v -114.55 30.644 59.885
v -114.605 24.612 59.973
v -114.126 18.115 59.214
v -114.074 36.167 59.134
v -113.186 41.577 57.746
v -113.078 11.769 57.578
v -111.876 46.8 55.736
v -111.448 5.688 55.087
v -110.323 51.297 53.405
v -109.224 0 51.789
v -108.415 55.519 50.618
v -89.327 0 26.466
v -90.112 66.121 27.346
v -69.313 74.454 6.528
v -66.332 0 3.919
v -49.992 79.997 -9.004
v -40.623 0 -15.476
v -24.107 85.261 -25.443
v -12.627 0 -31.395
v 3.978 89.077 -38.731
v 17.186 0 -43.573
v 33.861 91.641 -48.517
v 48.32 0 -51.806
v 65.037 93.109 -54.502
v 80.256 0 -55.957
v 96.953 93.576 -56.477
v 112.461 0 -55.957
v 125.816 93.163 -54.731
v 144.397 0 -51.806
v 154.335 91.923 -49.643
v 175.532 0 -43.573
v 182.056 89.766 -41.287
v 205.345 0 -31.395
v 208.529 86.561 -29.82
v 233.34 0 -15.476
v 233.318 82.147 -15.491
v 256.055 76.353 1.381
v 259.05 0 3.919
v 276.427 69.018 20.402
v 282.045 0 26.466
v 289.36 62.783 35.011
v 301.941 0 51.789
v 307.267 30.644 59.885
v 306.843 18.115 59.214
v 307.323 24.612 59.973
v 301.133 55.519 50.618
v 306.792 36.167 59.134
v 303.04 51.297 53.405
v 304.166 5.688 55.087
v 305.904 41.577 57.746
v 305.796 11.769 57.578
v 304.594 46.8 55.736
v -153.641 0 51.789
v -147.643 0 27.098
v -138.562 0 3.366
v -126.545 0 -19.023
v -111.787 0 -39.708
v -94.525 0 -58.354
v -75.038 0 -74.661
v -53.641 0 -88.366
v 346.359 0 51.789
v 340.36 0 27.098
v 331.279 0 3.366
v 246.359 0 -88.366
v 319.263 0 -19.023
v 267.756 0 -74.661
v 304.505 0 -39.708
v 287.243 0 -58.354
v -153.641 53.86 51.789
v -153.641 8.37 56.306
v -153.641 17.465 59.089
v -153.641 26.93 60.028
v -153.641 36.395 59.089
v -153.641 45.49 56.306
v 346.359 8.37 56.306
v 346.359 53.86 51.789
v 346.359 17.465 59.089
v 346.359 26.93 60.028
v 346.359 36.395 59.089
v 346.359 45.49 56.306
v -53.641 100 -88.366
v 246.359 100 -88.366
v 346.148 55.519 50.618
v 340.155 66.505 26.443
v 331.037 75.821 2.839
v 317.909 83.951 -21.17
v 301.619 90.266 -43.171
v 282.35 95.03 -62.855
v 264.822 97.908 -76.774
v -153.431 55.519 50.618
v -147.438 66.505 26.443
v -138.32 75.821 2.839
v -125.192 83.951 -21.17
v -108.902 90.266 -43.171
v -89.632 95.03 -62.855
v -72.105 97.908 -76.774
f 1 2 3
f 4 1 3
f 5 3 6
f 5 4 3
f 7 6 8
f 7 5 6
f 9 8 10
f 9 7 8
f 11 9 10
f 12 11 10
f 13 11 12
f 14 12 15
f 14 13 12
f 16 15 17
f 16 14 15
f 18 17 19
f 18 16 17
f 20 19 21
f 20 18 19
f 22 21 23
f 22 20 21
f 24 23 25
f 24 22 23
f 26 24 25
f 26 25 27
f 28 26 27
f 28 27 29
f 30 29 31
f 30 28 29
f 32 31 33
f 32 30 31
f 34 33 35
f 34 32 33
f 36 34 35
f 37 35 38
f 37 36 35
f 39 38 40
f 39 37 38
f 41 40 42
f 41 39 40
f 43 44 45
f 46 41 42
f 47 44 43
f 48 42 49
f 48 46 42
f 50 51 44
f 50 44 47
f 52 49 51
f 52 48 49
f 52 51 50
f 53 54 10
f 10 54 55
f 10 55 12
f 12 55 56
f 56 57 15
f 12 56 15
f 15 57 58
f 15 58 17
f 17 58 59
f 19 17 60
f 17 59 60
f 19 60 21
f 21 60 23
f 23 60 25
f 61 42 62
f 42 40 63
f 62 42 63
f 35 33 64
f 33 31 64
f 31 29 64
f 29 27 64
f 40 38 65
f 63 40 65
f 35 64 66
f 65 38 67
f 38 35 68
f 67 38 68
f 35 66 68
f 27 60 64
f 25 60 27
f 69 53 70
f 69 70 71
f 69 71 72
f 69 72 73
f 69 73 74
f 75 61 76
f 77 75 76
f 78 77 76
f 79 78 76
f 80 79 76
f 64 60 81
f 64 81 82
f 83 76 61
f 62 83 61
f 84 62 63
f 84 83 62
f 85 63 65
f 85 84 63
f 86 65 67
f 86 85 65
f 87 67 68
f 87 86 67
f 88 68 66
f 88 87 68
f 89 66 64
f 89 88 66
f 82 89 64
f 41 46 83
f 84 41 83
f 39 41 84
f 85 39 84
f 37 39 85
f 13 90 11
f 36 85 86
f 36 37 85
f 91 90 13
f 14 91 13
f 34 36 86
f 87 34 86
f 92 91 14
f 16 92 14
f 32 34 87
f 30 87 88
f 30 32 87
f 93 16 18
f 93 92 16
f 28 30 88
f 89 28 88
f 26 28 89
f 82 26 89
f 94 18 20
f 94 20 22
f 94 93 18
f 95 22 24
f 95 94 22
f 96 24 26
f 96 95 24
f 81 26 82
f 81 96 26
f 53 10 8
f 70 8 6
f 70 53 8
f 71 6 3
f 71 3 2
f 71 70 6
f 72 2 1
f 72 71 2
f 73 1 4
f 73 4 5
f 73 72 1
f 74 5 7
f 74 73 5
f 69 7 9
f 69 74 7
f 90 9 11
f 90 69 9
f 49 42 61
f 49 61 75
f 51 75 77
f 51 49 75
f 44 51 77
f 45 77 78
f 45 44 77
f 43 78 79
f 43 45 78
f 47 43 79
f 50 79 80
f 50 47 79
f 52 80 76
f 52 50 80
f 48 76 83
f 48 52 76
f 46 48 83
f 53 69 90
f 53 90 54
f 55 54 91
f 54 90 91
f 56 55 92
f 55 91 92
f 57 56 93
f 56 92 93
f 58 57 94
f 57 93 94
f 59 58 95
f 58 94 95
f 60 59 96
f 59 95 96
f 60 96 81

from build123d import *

# Parameters (mm, degrees)
SKETCH2_W           = 500
SKETCH2_H           = 150
BOSS_EXTRUDE1_DEPTH = 100
CUT_EXTRUDE1_DEPTH  = 540
SKETCH5_R           = 249.318658331
CUT_EXTRUDE2_DEPTH  = 560
CUT_EXTRUDE3_DEPTH  = 560


with BuildPart() as part:
    # Sketch2 → Boss-Extrude1 (new body)
    with BuildSketch(Plane(origin=(0, 0, 0), x_dir=(1, 0, 0), z_dir=(0, 1, 0))):
        with Locations((96.358792185, 13.36589698)):
            Rectangle(SKETCH2_W, SKETCH2_H)
    extrude(amount=BOSS_EXTRUDE1_DEPTH)

    # Sketch4 → Cut-Extrude1 (cut)
    with BuildSketch(Plane.ZY.offset(153.641207815)):
        with BuildLine():
            Line((-88.36589698, 100), (61.63410302, 100))
            Line((61.63410302, 100), (61.63410302, 50))
            Line((61.63410302, 50), (61.63410302, 0))
            Line((61.63410302, 0), (51.789240426, 0))
            ThreePointArc((51.789240426, 0), (60.017726044, 27.945379527), (50.617731539, 55.518778225))
            ThreePointArc((50.617731539, 55.518778225), (-17.284897104, 82.724872852), (-88.36589698, 100))
        make_face()
    extrude(amount=-CUT_EXTRUDE1_DEPTH, mode=Mode.SUBTRACT)

    # Sketch5 → Cut-Extrude2 (cut)
    with BuildSketch(Plane(origin=(0, 100, 0), x_dir=(-1, 0, 0), z_dir=(0, -1, 0))):
        with Locations((-96.358792185, -192.841012905)):
            Circle(SKETCH5_R)
    extrude(amount=CUT_EXTRUDE2_DEPTH, mode=Mode.SUBTRACT)

    # Sketch6 → Cut-Extrude3 (cut)
    with BuildSketch(Plane(origin=(0, 100, 0), x_dir=(-1, 0, 0), z_dir=(0, -1, 0))):
        with BuildLine():
            Line((-246.358792185, 88.36589698), (-346.358792185, 88.36589698))
            Line((-346.358792185, 88.36589698), (-346.358792185, -51.789240426))
            ThreePointArc((-346.358792185, -51.789240426), (-312.212496259, 29.599868023), (-246.358792185, 88.36589698))
        make_face()
        with BuildLine():
            Line((53.641207815, 88.36589698), (153.641207815, 88.36589698))
            Line((153.641207815, 88.36589698), (153.641207815, -51.789240426))
            ThreePointArc((153.641207815, -51.789240426), (119.49491189, 29.599868023), (53.641207815, 88.36589698))
        make_face()
    extrude(amount=CUT_EXTRUDE3_DEPTH, mode=Mode.SUBTRACT)


solid = part.part
